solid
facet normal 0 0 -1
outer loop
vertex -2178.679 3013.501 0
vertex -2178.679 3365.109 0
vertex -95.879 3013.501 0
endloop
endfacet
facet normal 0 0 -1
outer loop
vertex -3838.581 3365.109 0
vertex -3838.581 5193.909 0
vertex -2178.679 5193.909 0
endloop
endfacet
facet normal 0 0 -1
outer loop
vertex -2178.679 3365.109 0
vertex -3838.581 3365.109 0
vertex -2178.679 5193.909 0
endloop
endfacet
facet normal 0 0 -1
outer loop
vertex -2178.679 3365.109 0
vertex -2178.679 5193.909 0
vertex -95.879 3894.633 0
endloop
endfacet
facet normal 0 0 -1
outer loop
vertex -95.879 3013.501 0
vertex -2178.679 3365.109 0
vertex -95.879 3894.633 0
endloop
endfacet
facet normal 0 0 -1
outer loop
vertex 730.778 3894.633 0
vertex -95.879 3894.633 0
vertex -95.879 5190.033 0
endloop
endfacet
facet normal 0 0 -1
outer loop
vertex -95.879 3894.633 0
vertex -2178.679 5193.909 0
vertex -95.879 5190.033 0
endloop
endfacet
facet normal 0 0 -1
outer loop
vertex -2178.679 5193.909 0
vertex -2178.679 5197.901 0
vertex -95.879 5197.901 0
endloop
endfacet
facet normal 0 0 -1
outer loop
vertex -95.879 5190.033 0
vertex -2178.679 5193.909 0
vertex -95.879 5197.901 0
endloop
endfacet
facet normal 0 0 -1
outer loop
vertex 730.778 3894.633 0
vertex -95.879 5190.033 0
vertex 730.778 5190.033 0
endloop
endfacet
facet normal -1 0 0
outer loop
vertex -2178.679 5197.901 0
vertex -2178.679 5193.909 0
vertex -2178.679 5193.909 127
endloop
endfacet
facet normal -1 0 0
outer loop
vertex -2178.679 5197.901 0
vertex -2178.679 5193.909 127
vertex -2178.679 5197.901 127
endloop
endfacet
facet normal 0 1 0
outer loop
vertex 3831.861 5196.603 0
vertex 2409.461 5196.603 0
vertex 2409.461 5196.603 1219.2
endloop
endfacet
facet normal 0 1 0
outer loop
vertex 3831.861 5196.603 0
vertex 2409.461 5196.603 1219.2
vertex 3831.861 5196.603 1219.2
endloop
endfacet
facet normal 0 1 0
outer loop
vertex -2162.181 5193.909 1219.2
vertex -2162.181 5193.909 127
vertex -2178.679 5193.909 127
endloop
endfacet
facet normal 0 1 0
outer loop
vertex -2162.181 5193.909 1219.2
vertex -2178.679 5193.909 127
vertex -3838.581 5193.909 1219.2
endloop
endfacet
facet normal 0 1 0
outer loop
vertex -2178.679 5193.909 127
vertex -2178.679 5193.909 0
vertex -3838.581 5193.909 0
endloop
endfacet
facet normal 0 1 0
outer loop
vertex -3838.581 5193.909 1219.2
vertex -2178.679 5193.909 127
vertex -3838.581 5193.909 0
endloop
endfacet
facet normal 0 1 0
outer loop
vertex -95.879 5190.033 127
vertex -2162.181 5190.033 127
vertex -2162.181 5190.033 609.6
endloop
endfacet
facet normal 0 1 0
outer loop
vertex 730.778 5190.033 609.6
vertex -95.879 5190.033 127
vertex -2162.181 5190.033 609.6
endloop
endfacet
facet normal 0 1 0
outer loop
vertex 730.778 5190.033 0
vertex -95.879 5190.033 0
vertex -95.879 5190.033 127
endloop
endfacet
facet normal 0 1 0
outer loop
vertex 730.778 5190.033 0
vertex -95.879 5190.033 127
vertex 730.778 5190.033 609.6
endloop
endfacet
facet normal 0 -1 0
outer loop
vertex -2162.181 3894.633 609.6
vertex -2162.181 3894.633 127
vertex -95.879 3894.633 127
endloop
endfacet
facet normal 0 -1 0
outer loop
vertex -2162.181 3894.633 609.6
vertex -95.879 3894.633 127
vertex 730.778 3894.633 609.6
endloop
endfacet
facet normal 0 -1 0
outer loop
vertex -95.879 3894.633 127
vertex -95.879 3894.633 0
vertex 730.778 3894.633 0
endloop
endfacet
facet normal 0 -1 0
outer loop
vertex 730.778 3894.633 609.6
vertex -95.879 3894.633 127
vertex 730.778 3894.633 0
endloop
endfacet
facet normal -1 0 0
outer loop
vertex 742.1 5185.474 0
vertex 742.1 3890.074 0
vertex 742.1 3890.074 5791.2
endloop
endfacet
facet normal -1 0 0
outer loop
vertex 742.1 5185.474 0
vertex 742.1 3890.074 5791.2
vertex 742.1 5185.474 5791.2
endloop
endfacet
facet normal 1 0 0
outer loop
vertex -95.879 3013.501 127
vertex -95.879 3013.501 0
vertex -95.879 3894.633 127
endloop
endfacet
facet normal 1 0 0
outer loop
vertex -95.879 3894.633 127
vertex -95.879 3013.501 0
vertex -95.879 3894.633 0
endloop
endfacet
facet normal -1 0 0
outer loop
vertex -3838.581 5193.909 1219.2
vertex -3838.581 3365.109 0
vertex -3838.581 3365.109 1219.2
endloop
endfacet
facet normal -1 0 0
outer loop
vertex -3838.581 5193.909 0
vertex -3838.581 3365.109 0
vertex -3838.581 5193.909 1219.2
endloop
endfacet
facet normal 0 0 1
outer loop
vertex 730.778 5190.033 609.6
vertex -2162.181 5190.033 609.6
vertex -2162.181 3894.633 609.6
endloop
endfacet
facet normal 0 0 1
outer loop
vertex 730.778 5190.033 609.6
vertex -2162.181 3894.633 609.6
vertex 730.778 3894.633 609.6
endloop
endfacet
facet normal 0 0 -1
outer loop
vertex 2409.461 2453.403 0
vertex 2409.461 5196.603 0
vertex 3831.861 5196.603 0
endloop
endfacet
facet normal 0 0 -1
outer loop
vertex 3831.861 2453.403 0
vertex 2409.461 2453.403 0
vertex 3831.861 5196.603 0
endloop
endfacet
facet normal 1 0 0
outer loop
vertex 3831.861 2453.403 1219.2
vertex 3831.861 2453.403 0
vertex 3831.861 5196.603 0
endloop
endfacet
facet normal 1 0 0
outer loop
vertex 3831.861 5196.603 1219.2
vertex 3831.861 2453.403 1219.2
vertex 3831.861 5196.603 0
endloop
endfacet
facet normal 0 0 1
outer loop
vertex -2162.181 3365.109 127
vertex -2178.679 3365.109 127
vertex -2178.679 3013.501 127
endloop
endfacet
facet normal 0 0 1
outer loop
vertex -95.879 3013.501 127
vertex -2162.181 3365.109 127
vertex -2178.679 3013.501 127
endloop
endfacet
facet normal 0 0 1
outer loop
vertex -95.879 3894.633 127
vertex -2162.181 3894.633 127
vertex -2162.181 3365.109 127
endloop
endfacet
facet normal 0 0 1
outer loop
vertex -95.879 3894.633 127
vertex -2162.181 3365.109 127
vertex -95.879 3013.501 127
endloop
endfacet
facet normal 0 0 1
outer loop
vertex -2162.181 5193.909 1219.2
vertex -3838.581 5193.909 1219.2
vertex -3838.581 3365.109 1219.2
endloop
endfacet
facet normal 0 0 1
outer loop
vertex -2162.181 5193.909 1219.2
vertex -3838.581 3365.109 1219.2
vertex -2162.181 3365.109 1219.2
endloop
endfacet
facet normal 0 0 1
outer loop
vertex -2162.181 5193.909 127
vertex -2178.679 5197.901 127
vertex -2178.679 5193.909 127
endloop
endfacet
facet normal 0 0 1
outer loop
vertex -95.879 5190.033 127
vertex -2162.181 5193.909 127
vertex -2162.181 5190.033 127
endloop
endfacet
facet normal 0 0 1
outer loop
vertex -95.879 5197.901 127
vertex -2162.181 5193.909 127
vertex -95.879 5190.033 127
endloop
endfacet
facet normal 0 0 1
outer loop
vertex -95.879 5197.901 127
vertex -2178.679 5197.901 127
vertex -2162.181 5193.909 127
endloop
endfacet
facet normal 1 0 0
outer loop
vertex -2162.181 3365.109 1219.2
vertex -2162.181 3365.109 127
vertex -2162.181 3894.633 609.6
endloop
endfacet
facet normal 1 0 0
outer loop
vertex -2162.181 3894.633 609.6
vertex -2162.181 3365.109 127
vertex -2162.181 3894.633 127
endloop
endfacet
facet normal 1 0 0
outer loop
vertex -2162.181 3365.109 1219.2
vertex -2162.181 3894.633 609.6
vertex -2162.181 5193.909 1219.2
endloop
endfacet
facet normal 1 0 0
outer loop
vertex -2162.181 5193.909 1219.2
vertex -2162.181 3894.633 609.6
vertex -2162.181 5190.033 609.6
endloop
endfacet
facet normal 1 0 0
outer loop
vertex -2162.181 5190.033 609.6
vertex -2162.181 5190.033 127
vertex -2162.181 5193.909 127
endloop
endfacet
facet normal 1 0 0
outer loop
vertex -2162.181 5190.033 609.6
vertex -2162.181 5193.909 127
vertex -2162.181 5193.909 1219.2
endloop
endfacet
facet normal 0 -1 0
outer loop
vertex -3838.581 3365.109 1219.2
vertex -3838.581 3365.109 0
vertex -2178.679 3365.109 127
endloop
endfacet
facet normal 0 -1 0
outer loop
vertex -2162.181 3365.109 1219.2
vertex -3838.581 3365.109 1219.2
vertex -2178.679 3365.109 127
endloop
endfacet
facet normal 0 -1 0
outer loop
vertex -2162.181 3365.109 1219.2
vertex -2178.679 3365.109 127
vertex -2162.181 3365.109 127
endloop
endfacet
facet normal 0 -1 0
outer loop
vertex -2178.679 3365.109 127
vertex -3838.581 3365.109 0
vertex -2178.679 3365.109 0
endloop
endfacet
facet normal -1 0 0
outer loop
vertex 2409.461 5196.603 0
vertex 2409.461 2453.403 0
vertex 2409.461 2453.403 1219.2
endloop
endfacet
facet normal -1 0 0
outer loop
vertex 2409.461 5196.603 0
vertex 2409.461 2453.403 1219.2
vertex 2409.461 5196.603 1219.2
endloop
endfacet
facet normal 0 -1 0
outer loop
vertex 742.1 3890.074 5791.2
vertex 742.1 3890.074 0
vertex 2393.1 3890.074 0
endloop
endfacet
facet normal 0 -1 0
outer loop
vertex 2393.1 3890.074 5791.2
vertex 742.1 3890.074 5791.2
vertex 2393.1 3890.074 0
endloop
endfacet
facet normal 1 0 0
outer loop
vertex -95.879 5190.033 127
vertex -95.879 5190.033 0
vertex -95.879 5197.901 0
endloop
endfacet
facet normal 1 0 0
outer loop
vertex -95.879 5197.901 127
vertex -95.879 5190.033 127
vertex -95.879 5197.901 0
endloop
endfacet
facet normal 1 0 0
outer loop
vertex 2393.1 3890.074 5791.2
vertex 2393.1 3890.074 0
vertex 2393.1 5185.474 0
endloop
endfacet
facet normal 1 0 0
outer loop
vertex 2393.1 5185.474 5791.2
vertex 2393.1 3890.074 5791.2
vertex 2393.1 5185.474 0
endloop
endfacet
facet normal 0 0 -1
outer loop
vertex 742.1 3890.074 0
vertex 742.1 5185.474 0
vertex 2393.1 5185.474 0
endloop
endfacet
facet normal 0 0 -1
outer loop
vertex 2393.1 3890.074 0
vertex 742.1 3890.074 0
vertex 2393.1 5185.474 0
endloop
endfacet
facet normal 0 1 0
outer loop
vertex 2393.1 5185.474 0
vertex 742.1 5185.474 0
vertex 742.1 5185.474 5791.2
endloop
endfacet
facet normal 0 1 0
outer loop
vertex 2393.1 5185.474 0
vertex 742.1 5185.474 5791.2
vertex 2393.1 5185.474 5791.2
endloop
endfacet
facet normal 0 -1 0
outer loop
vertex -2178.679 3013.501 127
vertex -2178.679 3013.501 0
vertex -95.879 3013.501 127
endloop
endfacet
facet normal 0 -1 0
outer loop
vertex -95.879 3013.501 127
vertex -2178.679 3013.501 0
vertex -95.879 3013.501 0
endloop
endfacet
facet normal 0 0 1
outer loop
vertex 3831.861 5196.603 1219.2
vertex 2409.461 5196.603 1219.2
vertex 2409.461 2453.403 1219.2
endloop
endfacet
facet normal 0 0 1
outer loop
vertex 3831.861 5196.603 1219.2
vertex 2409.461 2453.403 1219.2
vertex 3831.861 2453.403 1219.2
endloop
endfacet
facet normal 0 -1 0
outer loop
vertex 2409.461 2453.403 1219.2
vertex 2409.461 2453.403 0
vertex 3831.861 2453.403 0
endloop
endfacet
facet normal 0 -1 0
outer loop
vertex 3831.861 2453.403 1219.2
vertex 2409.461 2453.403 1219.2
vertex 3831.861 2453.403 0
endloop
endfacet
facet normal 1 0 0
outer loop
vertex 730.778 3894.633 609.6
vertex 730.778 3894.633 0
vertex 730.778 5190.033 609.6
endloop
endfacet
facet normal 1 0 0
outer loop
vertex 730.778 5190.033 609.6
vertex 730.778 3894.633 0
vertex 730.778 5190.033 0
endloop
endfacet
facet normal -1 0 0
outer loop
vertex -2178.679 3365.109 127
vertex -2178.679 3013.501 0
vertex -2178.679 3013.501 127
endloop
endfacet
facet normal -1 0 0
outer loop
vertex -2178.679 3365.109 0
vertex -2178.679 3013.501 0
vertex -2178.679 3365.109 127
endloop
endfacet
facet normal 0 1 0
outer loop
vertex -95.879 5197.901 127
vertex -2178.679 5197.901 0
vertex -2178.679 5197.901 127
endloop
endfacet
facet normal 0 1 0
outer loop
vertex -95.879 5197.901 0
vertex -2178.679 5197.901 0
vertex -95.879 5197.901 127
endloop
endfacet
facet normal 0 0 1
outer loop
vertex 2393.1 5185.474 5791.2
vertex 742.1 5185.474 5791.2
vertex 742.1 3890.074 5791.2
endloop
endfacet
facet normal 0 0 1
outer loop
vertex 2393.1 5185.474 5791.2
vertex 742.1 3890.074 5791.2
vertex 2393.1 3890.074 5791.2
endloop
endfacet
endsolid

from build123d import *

# Parameters (mm, degrees)
F1_W      = 21.263506
F1_H      = 1828.8
F1_W_2    = 1655.136494
F2_DEPTH  = 1219.2
F4_W      = 1651
F4_H      = 1295.4
F5_DEPTH  = 5791.2
F3_W      = 2895.6
F3_H      = 1295.4
F6_DEPTH  = 609.6
F7_W      = 1422.4
F7_H      = 2743.2
F8_DEPTH  = 1219.2
F9_W      = 2082.8
F9_H      = 2184.4
F10_DEPTH = 127


with BuildPart() as f2:
    # F1 (on face) → F2 (new body)
    with BuildSketch(Plane.XY):
        with Locations((-3827.949094, 4279.508967)):
            Rectangle(F1_W, F1_H)
        with Locations((-2989.749094, 4279.508967)):
            Rectangle(F1_W_2, F1_H)
    extrude(amount=F2_DEPTH)

    # F3 (on face) → F6 (join)
    with BuildSketch(Plane.XY):
        with Locations((-717.022002, 4542.333493)):
            Rectangle(F3_W, F3_H)
    extrude(amount=F6_DEPTH)

    # F9 (on face) → F10 (join)
    with BuildSketch(Plane.XY):
        with Locations((-1137.278513, 4105.700929)):
            Rectangle(F9_W, F9_H)
    extrude(amount=F10_DEPTH)


with BuildPart() as f5:
    # F4 (on face) → F5 (new body)
    with BuildSketch(Plane.XY):
        with Locations((1567.599952, 4537.774311)):
            Rectangle(F4_W, F4_H)
    extrude(amount=F5_DEPTH)


with BuildPart() as f8:
    # F7 (on face) → F8 (new body)
    with BuildSketch(Plane.XY):
        with Locations((3120.660663, 3825.003185)):
            Rectangle(F7_W, F7_H)
    extrude(amount=F8_DEPTH)


solid = Compound([f2.part, f5.part, f8.part])
